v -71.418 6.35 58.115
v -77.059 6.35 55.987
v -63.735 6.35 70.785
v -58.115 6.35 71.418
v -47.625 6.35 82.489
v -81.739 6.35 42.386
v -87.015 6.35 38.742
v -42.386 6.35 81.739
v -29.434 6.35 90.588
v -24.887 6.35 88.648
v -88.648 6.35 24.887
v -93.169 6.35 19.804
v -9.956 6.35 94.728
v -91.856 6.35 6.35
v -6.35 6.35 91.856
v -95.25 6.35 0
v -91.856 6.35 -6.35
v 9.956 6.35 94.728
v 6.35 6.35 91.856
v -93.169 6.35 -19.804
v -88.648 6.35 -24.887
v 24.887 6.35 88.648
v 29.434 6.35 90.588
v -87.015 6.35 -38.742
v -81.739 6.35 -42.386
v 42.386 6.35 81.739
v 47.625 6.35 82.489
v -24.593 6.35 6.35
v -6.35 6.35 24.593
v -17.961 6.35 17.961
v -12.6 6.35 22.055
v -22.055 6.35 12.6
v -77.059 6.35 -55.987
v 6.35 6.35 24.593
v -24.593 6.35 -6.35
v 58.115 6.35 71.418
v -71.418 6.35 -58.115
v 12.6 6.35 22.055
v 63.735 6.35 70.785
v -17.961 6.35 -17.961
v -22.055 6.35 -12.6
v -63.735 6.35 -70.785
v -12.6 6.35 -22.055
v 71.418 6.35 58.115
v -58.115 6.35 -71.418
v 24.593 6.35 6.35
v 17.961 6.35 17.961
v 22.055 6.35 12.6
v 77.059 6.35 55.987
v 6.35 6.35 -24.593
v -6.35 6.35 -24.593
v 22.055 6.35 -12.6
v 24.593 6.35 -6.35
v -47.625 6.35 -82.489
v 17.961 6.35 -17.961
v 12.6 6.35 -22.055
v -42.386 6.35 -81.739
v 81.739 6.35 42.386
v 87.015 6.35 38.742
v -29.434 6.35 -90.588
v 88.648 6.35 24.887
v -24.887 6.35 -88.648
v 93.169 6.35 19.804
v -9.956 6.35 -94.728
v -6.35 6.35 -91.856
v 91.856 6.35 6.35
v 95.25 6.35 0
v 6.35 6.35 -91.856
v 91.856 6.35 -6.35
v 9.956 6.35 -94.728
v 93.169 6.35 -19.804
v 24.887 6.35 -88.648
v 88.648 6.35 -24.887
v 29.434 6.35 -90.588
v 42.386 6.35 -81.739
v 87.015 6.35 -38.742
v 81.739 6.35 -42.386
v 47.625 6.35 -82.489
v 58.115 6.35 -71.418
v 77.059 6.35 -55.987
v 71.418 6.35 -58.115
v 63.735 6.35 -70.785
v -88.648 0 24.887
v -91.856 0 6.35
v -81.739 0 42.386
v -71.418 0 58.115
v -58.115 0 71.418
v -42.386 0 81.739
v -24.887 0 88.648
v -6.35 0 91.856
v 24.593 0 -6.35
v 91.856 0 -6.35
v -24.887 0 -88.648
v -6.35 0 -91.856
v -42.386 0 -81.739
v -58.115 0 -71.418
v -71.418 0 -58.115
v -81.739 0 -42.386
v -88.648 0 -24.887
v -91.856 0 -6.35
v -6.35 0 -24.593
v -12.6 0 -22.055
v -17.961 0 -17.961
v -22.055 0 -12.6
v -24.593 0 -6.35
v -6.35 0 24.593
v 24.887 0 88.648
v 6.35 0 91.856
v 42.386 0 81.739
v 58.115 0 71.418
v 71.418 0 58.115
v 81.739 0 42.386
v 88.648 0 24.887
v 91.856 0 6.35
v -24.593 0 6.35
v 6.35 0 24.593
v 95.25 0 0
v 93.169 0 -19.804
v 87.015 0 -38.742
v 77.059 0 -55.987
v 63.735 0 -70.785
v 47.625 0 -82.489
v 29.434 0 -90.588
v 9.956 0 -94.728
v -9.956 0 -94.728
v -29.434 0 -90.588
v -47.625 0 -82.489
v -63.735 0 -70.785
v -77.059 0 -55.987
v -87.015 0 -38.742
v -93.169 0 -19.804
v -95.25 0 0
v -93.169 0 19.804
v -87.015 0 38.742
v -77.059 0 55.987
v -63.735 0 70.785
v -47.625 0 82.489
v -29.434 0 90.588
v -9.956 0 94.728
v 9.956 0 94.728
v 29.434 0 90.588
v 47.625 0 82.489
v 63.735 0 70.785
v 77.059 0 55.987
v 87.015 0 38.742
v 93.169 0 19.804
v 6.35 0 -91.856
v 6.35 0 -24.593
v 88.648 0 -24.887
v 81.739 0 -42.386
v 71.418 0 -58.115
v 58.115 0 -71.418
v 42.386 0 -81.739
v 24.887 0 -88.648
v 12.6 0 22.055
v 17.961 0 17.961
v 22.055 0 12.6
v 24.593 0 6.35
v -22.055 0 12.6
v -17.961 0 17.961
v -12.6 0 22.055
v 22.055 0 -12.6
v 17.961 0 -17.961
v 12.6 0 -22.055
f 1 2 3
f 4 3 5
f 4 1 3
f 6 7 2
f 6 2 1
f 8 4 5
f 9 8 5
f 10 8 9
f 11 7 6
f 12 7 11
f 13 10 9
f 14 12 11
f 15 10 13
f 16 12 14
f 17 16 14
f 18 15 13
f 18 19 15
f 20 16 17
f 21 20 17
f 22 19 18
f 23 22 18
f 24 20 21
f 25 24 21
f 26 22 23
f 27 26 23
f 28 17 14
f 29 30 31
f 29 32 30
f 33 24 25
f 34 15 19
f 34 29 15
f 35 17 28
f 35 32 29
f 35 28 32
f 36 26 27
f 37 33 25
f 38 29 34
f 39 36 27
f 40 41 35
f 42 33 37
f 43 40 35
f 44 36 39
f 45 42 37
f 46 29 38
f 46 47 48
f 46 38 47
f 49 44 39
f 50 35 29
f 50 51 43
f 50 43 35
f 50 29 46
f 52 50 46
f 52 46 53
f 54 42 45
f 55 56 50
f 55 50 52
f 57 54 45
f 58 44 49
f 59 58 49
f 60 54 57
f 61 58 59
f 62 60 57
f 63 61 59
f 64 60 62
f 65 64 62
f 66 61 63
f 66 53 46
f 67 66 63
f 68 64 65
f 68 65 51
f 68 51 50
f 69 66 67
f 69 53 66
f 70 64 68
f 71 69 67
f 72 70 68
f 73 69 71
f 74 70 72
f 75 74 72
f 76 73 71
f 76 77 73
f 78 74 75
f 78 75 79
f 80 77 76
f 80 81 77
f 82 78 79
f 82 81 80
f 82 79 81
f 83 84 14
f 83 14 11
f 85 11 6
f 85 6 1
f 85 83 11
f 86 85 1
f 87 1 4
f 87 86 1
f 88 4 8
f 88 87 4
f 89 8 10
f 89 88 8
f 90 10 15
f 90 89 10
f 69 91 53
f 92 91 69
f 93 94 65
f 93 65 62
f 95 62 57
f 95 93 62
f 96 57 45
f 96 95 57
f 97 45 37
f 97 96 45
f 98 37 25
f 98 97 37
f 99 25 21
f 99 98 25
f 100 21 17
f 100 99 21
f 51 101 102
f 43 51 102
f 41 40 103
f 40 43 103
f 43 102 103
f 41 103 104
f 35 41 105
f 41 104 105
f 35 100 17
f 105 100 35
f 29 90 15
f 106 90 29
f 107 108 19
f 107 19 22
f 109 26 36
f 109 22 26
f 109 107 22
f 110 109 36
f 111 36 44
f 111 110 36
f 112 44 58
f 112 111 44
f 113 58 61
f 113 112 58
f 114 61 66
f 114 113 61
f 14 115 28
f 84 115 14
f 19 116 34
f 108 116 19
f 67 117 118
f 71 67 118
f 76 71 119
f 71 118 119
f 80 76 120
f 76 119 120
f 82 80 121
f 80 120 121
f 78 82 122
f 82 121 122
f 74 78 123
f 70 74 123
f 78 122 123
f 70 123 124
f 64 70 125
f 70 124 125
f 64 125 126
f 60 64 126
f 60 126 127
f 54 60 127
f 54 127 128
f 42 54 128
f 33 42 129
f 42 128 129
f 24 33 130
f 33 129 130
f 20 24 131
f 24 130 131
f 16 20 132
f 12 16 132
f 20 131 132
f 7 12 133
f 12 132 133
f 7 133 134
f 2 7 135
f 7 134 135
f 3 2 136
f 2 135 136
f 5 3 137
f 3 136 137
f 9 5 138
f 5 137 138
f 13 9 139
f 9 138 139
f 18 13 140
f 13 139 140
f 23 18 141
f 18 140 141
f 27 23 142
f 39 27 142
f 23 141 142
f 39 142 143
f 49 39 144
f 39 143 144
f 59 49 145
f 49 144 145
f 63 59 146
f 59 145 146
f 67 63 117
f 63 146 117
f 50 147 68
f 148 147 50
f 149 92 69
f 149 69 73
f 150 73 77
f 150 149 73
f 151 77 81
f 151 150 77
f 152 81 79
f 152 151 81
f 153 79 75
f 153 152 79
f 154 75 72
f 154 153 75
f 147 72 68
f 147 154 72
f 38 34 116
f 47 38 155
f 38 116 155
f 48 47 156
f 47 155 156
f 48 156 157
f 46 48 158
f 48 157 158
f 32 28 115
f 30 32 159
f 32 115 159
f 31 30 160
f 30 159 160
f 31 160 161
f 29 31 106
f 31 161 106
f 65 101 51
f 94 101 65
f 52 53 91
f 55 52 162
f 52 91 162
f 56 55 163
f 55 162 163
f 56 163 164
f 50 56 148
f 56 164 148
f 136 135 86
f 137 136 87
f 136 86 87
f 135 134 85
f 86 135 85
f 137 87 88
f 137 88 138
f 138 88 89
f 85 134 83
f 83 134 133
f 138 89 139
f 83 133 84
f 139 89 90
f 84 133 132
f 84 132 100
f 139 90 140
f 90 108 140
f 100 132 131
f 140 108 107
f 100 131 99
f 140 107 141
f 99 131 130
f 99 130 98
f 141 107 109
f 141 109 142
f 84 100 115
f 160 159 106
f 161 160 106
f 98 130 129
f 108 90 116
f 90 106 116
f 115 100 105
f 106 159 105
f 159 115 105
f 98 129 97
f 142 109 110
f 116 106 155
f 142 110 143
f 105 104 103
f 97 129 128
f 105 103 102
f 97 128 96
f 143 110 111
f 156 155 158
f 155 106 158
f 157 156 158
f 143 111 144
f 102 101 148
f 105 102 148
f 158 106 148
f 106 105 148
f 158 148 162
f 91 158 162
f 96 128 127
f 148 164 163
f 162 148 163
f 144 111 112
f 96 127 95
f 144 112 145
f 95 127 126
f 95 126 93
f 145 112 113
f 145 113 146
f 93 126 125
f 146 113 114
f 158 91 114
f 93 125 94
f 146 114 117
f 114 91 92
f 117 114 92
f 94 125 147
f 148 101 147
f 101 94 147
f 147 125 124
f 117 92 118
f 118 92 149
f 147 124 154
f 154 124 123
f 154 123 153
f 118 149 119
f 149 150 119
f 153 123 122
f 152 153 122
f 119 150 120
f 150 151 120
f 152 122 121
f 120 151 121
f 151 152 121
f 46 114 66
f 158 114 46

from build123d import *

# Parameters (mm, degrees)
BEAM_DEPTH        = 6.35
CENTER_R          = 25.4
CENTER1_DEPTH     = 6.35
RING_R            = 95.25
RING_R_2          = 92.075
RING1_DEPTH       = 6.35
CIRPATTERN3_COUNT = 4


with BuildPart() as part:
    # Beams → Beam (new body)
    with BuildSketch(Plane(origin=(0, 0, 0), x_dir=(1, 0, 0), z_dir=(0, 1, 0))):
        with BuildLine():
            Line((-91.855773498, 6.35), (-24.593444248, 6.35))
            ThreePointArc((-24.593444248, 6.35), (-25.4, 0), (-24.593444248, -6.35))
            Line((-24.593444248, -6.35), (-91.855773498, -6.35))
            ThreePointArc((-91.855773498, -6.35), (-92.075, 0), (-91.855773498, 6.35))
        make_face()
    beam = extrude(amount=BEAM_DEPTH)

    # Center → Center1 (add)
    with BuildSketch(Plane(origin=(0, 0, 0), x_dir=(1, 0, 0), z_dir=(0, 1, 0))):
        Circle(CENTER_R)
    extrude(amount=CENTER1_DEPTH)

    # Ring → Ring1 (add)
    with BuildSketch(Plane(origin=(0, 0, 0), x_dir=(1, 0, 0), z_dir=(0, 1, 0))):
        Circle(RING_R)
        Circle(RING_R_2, mode=Mode.SUBTRACT)
    extrude(amount=RING1_DEPTH)

    # CirPattern3: Beam ×4 about axis
    cirpattern3_axis = Axis((0, 0, 0), (0, 1, 0))
    for i in range(1, CIRPATTERN3_COUNT):
        add(beam.rotate(cirpattern3_axis, i * 360 / CIRPATTERN3_COUNT))


solid = part.part
